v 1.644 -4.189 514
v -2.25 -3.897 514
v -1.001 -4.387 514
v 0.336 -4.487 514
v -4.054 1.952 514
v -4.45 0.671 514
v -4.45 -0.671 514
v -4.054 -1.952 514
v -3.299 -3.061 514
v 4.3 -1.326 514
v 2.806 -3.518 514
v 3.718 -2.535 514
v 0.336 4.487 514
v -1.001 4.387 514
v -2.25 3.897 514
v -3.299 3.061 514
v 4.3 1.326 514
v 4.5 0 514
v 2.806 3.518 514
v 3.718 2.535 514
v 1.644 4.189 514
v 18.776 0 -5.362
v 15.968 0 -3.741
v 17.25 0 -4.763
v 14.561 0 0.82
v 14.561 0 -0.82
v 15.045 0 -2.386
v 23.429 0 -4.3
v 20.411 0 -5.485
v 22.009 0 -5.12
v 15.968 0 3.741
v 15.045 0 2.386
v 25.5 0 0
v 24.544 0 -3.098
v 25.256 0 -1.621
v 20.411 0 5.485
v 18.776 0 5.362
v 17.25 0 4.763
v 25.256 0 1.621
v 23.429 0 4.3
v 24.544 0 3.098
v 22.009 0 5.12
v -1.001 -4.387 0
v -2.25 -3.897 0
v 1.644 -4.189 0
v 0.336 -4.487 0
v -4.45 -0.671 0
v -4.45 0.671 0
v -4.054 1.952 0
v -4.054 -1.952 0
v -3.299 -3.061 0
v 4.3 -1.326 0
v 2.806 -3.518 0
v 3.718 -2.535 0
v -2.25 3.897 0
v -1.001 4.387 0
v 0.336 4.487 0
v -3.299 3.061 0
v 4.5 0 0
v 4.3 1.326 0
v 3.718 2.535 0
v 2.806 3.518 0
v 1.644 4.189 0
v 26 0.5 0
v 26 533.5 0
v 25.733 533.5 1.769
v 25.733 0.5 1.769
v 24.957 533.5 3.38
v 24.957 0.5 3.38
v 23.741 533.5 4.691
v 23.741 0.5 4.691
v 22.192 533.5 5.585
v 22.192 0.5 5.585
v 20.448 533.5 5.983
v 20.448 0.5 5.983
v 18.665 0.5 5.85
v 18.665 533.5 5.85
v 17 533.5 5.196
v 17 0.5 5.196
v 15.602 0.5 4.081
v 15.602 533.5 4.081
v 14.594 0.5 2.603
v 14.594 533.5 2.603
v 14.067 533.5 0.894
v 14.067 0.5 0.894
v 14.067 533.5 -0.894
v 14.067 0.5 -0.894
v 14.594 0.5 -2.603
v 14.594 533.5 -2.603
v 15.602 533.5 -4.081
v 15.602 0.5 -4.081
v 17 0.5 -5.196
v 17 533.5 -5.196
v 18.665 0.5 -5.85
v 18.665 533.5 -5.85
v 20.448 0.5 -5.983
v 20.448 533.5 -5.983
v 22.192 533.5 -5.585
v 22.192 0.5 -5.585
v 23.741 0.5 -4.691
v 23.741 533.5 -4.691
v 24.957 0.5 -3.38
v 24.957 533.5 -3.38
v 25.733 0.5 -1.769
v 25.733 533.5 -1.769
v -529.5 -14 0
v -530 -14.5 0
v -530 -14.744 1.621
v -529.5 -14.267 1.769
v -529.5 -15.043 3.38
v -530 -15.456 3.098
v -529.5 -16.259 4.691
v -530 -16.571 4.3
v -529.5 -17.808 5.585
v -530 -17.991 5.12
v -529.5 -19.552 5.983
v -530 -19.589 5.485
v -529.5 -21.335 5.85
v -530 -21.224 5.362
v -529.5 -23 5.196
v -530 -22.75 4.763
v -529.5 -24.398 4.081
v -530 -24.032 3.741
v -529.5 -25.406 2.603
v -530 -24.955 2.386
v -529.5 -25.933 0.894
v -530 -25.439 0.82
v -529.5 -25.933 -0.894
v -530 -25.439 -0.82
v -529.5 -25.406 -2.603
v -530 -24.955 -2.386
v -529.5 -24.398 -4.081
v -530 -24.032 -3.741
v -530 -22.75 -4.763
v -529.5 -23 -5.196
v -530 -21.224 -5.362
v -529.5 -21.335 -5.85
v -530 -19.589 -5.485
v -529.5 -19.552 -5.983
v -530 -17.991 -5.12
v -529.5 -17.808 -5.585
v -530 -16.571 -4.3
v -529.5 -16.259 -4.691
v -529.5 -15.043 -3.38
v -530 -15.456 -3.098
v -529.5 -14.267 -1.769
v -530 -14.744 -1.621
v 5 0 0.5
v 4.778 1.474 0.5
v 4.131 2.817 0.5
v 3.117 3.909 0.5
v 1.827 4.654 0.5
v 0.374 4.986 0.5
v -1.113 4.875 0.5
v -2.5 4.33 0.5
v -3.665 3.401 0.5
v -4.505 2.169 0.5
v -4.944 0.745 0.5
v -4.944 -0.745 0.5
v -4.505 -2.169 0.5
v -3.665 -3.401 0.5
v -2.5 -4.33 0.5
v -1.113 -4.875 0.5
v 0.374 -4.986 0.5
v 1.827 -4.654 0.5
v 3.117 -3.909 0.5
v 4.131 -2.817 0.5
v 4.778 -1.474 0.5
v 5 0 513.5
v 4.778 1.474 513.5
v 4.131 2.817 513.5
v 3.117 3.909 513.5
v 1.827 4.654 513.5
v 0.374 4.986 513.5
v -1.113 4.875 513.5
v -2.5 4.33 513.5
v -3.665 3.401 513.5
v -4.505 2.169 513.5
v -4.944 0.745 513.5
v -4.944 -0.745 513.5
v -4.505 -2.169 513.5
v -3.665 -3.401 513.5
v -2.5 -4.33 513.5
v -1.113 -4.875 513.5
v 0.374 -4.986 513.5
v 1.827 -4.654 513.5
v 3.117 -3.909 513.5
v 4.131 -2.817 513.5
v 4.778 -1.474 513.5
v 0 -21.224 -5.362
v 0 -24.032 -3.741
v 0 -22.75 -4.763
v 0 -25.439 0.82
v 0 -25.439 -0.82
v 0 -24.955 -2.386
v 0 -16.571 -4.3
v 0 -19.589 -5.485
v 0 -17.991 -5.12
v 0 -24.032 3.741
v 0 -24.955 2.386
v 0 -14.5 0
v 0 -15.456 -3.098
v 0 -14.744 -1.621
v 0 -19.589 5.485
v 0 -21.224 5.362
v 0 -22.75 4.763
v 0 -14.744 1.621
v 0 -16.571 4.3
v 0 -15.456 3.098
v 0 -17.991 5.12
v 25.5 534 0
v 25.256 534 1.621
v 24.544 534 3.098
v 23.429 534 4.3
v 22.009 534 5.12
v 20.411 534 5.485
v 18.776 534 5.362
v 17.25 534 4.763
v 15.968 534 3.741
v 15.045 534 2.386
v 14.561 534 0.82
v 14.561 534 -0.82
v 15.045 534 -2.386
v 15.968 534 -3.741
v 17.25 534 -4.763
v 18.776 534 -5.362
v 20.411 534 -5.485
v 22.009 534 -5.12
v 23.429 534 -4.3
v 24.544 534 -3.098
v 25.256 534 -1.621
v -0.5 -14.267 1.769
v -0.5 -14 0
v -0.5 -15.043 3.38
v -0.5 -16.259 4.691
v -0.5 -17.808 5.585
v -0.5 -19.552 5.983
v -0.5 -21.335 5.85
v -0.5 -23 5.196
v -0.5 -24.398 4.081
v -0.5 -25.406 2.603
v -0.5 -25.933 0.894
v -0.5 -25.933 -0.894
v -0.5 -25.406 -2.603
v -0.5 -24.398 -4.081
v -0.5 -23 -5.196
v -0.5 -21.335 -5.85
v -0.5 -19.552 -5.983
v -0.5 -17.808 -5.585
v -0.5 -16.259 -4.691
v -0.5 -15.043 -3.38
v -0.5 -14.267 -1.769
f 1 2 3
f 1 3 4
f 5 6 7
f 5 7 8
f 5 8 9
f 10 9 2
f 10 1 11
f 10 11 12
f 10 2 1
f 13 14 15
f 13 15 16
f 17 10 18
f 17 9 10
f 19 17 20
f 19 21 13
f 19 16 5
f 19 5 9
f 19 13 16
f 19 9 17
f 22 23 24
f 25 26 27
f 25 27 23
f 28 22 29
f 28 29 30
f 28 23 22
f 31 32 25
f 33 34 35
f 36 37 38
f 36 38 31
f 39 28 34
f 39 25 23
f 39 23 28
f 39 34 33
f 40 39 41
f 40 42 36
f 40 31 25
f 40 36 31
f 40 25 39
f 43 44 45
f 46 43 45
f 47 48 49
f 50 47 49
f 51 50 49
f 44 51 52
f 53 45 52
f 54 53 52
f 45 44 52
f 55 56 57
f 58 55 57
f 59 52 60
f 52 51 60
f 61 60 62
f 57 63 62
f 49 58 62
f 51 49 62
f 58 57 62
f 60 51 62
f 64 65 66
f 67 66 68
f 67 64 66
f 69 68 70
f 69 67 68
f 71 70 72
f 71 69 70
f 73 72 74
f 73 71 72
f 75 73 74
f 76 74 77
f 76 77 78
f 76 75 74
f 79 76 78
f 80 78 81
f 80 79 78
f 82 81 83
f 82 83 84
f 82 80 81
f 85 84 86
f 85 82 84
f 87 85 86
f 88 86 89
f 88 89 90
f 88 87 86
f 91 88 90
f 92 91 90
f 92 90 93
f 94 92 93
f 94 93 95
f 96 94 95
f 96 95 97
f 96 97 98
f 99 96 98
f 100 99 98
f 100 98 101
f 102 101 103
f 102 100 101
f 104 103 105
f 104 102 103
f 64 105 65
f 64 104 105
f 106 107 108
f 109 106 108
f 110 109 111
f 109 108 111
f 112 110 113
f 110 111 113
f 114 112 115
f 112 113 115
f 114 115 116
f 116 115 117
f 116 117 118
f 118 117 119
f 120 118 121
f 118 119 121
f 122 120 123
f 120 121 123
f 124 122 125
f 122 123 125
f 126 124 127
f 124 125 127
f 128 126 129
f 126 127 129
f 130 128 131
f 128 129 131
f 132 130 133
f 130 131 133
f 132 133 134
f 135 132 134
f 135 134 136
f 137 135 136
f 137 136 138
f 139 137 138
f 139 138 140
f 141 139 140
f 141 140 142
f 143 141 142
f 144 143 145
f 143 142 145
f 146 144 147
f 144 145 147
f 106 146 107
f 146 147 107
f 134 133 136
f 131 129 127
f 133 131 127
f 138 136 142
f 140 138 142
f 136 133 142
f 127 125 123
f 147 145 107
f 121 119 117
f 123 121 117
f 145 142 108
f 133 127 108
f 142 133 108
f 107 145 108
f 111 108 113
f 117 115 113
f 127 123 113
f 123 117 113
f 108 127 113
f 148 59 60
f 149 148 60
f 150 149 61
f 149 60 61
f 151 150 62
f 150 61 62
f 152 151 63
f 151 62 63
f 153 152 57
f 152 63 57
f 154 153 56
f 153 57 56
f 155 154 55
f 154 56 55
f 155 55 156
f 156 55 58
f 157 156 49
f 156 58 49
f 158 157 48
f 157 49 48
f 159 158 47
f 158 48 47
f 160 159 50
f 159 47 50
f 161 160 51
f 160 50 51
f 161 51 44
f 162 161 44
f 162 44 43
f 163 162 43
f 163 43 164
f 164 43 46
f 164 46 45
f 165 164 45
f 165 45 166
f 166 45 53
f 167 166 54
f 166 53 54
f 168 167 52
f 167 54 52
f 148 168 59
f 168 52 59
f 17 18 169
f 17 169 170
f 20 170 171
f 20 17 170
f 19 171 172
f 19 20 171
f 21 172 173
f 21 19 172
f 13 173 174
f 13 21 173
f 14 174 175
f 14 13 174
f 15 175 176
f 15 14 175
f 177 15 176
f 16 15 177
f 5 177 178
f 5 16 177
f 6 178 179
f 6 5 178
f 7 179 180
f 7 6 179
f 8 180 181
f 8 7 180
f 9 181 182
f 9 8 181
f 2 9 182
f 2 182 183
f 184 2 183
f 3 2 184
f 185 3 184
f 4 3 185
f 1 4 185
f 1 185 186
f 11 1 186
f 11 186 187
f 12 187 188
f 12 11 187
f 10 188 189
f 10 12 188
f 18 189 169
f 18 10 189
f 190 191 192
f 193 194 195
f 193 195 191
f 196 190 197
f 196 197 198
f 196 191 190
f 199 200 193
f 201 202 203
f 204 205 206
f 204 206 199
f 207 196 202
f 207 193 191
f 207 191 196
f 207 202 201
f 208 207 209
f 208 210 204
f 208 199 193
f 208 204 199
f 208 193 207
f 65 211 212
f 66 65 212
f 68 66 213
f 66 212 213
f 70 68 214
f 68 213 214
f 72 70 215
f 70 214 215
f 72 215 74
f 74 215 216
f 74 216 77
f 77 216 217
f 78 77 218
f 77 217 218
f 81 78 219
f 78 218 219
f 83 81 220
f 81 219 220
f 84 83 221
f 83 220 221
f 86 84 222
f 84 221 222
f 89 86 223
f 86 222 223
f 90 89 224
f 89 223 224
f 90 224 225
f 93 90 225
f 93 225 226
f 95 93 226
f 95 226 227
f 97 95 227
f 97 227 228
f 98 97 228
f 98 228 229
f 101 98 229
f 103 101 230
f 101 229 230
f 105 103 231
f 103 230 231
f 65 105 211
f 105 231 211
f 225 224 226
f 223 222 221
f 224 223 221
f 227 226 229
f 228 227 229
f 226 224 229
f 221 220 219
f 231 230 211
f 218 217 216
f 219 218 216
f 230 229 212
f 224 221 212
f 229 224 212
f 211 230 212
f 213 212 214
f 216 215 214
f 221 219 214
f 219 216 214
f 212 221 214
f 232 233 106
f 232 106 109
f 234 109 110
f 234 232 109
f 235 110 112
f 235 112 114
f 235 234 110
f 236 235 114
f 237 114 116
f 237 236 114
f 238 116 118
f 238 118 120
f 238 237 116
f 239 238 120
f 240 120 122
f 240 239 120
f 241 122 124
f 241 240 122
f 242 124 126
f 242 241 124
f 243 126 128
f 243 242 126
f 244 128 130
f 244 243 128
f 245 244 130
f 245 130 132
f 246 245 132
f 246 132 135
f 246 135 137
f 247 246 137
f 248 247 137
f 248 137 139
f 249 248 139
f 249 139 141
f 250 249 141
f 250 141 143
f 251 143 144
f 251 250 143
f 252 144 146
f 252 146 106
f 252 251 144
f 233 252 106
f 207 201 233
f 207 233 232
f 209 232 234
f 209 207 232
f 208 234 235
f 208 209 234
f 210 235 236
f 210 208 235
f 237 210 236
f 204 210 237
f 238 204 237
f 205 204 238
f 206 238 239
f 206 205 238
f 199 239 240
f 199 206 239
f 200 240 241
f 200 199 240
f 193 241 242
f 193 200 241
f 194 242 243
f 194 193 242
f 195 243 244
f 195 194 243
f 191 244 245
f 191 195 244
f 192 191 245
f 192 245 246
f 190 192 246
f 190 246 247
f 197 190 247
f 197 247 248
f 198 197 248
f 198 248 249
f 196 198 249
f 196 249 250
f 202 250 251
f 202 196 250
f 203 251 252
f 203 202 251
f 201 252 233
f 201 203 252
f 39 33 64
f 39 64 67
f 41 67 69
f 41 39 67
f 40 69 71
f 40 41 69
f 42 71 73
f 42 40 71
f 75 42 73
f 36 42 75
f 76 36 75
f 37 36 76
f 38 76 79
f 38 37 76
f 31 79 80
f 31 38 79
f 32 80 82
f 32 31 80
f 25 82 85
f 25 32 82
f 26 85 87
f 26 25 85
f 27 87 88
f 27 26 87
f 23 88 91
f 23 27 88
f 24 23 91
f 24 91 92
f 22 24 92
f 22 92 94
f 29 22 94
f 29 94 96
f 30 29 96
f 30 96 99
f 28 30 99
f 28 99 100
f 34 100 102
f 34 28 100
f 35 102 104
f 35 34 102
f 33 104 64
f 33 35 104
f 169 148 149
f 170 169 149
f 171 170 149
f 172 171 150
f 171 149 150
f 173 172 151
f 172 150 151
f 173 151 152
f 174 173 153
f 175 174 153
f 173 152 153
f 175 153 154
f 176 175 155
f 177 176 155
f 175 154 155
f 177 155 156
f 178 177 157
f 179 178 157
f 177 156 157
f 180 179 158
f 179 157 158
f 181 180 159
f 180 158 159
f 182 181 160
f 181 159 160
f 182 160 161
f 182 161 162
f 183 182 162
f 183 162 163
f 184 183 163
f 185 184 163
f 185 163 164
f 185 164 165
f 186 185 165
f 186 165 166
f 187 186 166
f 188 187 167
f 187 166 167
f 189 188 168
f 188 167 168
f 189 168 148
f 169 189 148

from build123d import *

# Parameters (mm, degrees)
F0_R     = 5
F1_DEPTH = 514
F2_SIZE  = 0.5
F3_R     = 6
F4_DEPTH = 534
F5_SIZE  = 0.5
F6_R     = 6
F7_DEPTH = 530
F8_SIZE  = 0.5


with BuildPart() as f1:
    # F0 (on Top) → F1 (new body)
    with BuildSketch(Plane.XY):
        Circle(F0_R)
    extrude(amount=F1_DEPTH)

    # F2
    f2_edges = [f1.edges().sort_by_distance(p)[0] for p in [
        (-5, 0, 514),
        (-5, 0, 0),
    ]]
    chamfer(f2_edges, length=F2_SIZE)


with BuildPart() as f4:
    # F3 (on Front) → F4 (new body)
    with BuildSketch(Plane.XZ):
        with Locations((20, 0)):
            Circle(F3_R)
    extrude(amount=-F4_DEPTH)

    # F5
    f5_edges = [f4.edges().sort_by_distance(p)[0] for p in [
        (14, 0, 0),
        (14, 534, 0),
    ]]
    chamfer(f5_edges, length=F5_SIZE)


with BuildPart() as f7:
    # F6 (on Right) → F7 (new body)
    with BuildSketch(Plane.YZ):
        with Locations((-20, 0)):
            Circle(F6_R)
    extrude(amount=-F7_DEPTH)

    # F8
    f8_edges = [f7.edges().sort_by_distance(p)[0] for p in [
        (0, -26, 0),
        (-530, -26, 0),
    ]]
    chamfer(f8_edges, length=F8_SIZE)


solid = Compound([f1.part, f4.part, f7.part])
